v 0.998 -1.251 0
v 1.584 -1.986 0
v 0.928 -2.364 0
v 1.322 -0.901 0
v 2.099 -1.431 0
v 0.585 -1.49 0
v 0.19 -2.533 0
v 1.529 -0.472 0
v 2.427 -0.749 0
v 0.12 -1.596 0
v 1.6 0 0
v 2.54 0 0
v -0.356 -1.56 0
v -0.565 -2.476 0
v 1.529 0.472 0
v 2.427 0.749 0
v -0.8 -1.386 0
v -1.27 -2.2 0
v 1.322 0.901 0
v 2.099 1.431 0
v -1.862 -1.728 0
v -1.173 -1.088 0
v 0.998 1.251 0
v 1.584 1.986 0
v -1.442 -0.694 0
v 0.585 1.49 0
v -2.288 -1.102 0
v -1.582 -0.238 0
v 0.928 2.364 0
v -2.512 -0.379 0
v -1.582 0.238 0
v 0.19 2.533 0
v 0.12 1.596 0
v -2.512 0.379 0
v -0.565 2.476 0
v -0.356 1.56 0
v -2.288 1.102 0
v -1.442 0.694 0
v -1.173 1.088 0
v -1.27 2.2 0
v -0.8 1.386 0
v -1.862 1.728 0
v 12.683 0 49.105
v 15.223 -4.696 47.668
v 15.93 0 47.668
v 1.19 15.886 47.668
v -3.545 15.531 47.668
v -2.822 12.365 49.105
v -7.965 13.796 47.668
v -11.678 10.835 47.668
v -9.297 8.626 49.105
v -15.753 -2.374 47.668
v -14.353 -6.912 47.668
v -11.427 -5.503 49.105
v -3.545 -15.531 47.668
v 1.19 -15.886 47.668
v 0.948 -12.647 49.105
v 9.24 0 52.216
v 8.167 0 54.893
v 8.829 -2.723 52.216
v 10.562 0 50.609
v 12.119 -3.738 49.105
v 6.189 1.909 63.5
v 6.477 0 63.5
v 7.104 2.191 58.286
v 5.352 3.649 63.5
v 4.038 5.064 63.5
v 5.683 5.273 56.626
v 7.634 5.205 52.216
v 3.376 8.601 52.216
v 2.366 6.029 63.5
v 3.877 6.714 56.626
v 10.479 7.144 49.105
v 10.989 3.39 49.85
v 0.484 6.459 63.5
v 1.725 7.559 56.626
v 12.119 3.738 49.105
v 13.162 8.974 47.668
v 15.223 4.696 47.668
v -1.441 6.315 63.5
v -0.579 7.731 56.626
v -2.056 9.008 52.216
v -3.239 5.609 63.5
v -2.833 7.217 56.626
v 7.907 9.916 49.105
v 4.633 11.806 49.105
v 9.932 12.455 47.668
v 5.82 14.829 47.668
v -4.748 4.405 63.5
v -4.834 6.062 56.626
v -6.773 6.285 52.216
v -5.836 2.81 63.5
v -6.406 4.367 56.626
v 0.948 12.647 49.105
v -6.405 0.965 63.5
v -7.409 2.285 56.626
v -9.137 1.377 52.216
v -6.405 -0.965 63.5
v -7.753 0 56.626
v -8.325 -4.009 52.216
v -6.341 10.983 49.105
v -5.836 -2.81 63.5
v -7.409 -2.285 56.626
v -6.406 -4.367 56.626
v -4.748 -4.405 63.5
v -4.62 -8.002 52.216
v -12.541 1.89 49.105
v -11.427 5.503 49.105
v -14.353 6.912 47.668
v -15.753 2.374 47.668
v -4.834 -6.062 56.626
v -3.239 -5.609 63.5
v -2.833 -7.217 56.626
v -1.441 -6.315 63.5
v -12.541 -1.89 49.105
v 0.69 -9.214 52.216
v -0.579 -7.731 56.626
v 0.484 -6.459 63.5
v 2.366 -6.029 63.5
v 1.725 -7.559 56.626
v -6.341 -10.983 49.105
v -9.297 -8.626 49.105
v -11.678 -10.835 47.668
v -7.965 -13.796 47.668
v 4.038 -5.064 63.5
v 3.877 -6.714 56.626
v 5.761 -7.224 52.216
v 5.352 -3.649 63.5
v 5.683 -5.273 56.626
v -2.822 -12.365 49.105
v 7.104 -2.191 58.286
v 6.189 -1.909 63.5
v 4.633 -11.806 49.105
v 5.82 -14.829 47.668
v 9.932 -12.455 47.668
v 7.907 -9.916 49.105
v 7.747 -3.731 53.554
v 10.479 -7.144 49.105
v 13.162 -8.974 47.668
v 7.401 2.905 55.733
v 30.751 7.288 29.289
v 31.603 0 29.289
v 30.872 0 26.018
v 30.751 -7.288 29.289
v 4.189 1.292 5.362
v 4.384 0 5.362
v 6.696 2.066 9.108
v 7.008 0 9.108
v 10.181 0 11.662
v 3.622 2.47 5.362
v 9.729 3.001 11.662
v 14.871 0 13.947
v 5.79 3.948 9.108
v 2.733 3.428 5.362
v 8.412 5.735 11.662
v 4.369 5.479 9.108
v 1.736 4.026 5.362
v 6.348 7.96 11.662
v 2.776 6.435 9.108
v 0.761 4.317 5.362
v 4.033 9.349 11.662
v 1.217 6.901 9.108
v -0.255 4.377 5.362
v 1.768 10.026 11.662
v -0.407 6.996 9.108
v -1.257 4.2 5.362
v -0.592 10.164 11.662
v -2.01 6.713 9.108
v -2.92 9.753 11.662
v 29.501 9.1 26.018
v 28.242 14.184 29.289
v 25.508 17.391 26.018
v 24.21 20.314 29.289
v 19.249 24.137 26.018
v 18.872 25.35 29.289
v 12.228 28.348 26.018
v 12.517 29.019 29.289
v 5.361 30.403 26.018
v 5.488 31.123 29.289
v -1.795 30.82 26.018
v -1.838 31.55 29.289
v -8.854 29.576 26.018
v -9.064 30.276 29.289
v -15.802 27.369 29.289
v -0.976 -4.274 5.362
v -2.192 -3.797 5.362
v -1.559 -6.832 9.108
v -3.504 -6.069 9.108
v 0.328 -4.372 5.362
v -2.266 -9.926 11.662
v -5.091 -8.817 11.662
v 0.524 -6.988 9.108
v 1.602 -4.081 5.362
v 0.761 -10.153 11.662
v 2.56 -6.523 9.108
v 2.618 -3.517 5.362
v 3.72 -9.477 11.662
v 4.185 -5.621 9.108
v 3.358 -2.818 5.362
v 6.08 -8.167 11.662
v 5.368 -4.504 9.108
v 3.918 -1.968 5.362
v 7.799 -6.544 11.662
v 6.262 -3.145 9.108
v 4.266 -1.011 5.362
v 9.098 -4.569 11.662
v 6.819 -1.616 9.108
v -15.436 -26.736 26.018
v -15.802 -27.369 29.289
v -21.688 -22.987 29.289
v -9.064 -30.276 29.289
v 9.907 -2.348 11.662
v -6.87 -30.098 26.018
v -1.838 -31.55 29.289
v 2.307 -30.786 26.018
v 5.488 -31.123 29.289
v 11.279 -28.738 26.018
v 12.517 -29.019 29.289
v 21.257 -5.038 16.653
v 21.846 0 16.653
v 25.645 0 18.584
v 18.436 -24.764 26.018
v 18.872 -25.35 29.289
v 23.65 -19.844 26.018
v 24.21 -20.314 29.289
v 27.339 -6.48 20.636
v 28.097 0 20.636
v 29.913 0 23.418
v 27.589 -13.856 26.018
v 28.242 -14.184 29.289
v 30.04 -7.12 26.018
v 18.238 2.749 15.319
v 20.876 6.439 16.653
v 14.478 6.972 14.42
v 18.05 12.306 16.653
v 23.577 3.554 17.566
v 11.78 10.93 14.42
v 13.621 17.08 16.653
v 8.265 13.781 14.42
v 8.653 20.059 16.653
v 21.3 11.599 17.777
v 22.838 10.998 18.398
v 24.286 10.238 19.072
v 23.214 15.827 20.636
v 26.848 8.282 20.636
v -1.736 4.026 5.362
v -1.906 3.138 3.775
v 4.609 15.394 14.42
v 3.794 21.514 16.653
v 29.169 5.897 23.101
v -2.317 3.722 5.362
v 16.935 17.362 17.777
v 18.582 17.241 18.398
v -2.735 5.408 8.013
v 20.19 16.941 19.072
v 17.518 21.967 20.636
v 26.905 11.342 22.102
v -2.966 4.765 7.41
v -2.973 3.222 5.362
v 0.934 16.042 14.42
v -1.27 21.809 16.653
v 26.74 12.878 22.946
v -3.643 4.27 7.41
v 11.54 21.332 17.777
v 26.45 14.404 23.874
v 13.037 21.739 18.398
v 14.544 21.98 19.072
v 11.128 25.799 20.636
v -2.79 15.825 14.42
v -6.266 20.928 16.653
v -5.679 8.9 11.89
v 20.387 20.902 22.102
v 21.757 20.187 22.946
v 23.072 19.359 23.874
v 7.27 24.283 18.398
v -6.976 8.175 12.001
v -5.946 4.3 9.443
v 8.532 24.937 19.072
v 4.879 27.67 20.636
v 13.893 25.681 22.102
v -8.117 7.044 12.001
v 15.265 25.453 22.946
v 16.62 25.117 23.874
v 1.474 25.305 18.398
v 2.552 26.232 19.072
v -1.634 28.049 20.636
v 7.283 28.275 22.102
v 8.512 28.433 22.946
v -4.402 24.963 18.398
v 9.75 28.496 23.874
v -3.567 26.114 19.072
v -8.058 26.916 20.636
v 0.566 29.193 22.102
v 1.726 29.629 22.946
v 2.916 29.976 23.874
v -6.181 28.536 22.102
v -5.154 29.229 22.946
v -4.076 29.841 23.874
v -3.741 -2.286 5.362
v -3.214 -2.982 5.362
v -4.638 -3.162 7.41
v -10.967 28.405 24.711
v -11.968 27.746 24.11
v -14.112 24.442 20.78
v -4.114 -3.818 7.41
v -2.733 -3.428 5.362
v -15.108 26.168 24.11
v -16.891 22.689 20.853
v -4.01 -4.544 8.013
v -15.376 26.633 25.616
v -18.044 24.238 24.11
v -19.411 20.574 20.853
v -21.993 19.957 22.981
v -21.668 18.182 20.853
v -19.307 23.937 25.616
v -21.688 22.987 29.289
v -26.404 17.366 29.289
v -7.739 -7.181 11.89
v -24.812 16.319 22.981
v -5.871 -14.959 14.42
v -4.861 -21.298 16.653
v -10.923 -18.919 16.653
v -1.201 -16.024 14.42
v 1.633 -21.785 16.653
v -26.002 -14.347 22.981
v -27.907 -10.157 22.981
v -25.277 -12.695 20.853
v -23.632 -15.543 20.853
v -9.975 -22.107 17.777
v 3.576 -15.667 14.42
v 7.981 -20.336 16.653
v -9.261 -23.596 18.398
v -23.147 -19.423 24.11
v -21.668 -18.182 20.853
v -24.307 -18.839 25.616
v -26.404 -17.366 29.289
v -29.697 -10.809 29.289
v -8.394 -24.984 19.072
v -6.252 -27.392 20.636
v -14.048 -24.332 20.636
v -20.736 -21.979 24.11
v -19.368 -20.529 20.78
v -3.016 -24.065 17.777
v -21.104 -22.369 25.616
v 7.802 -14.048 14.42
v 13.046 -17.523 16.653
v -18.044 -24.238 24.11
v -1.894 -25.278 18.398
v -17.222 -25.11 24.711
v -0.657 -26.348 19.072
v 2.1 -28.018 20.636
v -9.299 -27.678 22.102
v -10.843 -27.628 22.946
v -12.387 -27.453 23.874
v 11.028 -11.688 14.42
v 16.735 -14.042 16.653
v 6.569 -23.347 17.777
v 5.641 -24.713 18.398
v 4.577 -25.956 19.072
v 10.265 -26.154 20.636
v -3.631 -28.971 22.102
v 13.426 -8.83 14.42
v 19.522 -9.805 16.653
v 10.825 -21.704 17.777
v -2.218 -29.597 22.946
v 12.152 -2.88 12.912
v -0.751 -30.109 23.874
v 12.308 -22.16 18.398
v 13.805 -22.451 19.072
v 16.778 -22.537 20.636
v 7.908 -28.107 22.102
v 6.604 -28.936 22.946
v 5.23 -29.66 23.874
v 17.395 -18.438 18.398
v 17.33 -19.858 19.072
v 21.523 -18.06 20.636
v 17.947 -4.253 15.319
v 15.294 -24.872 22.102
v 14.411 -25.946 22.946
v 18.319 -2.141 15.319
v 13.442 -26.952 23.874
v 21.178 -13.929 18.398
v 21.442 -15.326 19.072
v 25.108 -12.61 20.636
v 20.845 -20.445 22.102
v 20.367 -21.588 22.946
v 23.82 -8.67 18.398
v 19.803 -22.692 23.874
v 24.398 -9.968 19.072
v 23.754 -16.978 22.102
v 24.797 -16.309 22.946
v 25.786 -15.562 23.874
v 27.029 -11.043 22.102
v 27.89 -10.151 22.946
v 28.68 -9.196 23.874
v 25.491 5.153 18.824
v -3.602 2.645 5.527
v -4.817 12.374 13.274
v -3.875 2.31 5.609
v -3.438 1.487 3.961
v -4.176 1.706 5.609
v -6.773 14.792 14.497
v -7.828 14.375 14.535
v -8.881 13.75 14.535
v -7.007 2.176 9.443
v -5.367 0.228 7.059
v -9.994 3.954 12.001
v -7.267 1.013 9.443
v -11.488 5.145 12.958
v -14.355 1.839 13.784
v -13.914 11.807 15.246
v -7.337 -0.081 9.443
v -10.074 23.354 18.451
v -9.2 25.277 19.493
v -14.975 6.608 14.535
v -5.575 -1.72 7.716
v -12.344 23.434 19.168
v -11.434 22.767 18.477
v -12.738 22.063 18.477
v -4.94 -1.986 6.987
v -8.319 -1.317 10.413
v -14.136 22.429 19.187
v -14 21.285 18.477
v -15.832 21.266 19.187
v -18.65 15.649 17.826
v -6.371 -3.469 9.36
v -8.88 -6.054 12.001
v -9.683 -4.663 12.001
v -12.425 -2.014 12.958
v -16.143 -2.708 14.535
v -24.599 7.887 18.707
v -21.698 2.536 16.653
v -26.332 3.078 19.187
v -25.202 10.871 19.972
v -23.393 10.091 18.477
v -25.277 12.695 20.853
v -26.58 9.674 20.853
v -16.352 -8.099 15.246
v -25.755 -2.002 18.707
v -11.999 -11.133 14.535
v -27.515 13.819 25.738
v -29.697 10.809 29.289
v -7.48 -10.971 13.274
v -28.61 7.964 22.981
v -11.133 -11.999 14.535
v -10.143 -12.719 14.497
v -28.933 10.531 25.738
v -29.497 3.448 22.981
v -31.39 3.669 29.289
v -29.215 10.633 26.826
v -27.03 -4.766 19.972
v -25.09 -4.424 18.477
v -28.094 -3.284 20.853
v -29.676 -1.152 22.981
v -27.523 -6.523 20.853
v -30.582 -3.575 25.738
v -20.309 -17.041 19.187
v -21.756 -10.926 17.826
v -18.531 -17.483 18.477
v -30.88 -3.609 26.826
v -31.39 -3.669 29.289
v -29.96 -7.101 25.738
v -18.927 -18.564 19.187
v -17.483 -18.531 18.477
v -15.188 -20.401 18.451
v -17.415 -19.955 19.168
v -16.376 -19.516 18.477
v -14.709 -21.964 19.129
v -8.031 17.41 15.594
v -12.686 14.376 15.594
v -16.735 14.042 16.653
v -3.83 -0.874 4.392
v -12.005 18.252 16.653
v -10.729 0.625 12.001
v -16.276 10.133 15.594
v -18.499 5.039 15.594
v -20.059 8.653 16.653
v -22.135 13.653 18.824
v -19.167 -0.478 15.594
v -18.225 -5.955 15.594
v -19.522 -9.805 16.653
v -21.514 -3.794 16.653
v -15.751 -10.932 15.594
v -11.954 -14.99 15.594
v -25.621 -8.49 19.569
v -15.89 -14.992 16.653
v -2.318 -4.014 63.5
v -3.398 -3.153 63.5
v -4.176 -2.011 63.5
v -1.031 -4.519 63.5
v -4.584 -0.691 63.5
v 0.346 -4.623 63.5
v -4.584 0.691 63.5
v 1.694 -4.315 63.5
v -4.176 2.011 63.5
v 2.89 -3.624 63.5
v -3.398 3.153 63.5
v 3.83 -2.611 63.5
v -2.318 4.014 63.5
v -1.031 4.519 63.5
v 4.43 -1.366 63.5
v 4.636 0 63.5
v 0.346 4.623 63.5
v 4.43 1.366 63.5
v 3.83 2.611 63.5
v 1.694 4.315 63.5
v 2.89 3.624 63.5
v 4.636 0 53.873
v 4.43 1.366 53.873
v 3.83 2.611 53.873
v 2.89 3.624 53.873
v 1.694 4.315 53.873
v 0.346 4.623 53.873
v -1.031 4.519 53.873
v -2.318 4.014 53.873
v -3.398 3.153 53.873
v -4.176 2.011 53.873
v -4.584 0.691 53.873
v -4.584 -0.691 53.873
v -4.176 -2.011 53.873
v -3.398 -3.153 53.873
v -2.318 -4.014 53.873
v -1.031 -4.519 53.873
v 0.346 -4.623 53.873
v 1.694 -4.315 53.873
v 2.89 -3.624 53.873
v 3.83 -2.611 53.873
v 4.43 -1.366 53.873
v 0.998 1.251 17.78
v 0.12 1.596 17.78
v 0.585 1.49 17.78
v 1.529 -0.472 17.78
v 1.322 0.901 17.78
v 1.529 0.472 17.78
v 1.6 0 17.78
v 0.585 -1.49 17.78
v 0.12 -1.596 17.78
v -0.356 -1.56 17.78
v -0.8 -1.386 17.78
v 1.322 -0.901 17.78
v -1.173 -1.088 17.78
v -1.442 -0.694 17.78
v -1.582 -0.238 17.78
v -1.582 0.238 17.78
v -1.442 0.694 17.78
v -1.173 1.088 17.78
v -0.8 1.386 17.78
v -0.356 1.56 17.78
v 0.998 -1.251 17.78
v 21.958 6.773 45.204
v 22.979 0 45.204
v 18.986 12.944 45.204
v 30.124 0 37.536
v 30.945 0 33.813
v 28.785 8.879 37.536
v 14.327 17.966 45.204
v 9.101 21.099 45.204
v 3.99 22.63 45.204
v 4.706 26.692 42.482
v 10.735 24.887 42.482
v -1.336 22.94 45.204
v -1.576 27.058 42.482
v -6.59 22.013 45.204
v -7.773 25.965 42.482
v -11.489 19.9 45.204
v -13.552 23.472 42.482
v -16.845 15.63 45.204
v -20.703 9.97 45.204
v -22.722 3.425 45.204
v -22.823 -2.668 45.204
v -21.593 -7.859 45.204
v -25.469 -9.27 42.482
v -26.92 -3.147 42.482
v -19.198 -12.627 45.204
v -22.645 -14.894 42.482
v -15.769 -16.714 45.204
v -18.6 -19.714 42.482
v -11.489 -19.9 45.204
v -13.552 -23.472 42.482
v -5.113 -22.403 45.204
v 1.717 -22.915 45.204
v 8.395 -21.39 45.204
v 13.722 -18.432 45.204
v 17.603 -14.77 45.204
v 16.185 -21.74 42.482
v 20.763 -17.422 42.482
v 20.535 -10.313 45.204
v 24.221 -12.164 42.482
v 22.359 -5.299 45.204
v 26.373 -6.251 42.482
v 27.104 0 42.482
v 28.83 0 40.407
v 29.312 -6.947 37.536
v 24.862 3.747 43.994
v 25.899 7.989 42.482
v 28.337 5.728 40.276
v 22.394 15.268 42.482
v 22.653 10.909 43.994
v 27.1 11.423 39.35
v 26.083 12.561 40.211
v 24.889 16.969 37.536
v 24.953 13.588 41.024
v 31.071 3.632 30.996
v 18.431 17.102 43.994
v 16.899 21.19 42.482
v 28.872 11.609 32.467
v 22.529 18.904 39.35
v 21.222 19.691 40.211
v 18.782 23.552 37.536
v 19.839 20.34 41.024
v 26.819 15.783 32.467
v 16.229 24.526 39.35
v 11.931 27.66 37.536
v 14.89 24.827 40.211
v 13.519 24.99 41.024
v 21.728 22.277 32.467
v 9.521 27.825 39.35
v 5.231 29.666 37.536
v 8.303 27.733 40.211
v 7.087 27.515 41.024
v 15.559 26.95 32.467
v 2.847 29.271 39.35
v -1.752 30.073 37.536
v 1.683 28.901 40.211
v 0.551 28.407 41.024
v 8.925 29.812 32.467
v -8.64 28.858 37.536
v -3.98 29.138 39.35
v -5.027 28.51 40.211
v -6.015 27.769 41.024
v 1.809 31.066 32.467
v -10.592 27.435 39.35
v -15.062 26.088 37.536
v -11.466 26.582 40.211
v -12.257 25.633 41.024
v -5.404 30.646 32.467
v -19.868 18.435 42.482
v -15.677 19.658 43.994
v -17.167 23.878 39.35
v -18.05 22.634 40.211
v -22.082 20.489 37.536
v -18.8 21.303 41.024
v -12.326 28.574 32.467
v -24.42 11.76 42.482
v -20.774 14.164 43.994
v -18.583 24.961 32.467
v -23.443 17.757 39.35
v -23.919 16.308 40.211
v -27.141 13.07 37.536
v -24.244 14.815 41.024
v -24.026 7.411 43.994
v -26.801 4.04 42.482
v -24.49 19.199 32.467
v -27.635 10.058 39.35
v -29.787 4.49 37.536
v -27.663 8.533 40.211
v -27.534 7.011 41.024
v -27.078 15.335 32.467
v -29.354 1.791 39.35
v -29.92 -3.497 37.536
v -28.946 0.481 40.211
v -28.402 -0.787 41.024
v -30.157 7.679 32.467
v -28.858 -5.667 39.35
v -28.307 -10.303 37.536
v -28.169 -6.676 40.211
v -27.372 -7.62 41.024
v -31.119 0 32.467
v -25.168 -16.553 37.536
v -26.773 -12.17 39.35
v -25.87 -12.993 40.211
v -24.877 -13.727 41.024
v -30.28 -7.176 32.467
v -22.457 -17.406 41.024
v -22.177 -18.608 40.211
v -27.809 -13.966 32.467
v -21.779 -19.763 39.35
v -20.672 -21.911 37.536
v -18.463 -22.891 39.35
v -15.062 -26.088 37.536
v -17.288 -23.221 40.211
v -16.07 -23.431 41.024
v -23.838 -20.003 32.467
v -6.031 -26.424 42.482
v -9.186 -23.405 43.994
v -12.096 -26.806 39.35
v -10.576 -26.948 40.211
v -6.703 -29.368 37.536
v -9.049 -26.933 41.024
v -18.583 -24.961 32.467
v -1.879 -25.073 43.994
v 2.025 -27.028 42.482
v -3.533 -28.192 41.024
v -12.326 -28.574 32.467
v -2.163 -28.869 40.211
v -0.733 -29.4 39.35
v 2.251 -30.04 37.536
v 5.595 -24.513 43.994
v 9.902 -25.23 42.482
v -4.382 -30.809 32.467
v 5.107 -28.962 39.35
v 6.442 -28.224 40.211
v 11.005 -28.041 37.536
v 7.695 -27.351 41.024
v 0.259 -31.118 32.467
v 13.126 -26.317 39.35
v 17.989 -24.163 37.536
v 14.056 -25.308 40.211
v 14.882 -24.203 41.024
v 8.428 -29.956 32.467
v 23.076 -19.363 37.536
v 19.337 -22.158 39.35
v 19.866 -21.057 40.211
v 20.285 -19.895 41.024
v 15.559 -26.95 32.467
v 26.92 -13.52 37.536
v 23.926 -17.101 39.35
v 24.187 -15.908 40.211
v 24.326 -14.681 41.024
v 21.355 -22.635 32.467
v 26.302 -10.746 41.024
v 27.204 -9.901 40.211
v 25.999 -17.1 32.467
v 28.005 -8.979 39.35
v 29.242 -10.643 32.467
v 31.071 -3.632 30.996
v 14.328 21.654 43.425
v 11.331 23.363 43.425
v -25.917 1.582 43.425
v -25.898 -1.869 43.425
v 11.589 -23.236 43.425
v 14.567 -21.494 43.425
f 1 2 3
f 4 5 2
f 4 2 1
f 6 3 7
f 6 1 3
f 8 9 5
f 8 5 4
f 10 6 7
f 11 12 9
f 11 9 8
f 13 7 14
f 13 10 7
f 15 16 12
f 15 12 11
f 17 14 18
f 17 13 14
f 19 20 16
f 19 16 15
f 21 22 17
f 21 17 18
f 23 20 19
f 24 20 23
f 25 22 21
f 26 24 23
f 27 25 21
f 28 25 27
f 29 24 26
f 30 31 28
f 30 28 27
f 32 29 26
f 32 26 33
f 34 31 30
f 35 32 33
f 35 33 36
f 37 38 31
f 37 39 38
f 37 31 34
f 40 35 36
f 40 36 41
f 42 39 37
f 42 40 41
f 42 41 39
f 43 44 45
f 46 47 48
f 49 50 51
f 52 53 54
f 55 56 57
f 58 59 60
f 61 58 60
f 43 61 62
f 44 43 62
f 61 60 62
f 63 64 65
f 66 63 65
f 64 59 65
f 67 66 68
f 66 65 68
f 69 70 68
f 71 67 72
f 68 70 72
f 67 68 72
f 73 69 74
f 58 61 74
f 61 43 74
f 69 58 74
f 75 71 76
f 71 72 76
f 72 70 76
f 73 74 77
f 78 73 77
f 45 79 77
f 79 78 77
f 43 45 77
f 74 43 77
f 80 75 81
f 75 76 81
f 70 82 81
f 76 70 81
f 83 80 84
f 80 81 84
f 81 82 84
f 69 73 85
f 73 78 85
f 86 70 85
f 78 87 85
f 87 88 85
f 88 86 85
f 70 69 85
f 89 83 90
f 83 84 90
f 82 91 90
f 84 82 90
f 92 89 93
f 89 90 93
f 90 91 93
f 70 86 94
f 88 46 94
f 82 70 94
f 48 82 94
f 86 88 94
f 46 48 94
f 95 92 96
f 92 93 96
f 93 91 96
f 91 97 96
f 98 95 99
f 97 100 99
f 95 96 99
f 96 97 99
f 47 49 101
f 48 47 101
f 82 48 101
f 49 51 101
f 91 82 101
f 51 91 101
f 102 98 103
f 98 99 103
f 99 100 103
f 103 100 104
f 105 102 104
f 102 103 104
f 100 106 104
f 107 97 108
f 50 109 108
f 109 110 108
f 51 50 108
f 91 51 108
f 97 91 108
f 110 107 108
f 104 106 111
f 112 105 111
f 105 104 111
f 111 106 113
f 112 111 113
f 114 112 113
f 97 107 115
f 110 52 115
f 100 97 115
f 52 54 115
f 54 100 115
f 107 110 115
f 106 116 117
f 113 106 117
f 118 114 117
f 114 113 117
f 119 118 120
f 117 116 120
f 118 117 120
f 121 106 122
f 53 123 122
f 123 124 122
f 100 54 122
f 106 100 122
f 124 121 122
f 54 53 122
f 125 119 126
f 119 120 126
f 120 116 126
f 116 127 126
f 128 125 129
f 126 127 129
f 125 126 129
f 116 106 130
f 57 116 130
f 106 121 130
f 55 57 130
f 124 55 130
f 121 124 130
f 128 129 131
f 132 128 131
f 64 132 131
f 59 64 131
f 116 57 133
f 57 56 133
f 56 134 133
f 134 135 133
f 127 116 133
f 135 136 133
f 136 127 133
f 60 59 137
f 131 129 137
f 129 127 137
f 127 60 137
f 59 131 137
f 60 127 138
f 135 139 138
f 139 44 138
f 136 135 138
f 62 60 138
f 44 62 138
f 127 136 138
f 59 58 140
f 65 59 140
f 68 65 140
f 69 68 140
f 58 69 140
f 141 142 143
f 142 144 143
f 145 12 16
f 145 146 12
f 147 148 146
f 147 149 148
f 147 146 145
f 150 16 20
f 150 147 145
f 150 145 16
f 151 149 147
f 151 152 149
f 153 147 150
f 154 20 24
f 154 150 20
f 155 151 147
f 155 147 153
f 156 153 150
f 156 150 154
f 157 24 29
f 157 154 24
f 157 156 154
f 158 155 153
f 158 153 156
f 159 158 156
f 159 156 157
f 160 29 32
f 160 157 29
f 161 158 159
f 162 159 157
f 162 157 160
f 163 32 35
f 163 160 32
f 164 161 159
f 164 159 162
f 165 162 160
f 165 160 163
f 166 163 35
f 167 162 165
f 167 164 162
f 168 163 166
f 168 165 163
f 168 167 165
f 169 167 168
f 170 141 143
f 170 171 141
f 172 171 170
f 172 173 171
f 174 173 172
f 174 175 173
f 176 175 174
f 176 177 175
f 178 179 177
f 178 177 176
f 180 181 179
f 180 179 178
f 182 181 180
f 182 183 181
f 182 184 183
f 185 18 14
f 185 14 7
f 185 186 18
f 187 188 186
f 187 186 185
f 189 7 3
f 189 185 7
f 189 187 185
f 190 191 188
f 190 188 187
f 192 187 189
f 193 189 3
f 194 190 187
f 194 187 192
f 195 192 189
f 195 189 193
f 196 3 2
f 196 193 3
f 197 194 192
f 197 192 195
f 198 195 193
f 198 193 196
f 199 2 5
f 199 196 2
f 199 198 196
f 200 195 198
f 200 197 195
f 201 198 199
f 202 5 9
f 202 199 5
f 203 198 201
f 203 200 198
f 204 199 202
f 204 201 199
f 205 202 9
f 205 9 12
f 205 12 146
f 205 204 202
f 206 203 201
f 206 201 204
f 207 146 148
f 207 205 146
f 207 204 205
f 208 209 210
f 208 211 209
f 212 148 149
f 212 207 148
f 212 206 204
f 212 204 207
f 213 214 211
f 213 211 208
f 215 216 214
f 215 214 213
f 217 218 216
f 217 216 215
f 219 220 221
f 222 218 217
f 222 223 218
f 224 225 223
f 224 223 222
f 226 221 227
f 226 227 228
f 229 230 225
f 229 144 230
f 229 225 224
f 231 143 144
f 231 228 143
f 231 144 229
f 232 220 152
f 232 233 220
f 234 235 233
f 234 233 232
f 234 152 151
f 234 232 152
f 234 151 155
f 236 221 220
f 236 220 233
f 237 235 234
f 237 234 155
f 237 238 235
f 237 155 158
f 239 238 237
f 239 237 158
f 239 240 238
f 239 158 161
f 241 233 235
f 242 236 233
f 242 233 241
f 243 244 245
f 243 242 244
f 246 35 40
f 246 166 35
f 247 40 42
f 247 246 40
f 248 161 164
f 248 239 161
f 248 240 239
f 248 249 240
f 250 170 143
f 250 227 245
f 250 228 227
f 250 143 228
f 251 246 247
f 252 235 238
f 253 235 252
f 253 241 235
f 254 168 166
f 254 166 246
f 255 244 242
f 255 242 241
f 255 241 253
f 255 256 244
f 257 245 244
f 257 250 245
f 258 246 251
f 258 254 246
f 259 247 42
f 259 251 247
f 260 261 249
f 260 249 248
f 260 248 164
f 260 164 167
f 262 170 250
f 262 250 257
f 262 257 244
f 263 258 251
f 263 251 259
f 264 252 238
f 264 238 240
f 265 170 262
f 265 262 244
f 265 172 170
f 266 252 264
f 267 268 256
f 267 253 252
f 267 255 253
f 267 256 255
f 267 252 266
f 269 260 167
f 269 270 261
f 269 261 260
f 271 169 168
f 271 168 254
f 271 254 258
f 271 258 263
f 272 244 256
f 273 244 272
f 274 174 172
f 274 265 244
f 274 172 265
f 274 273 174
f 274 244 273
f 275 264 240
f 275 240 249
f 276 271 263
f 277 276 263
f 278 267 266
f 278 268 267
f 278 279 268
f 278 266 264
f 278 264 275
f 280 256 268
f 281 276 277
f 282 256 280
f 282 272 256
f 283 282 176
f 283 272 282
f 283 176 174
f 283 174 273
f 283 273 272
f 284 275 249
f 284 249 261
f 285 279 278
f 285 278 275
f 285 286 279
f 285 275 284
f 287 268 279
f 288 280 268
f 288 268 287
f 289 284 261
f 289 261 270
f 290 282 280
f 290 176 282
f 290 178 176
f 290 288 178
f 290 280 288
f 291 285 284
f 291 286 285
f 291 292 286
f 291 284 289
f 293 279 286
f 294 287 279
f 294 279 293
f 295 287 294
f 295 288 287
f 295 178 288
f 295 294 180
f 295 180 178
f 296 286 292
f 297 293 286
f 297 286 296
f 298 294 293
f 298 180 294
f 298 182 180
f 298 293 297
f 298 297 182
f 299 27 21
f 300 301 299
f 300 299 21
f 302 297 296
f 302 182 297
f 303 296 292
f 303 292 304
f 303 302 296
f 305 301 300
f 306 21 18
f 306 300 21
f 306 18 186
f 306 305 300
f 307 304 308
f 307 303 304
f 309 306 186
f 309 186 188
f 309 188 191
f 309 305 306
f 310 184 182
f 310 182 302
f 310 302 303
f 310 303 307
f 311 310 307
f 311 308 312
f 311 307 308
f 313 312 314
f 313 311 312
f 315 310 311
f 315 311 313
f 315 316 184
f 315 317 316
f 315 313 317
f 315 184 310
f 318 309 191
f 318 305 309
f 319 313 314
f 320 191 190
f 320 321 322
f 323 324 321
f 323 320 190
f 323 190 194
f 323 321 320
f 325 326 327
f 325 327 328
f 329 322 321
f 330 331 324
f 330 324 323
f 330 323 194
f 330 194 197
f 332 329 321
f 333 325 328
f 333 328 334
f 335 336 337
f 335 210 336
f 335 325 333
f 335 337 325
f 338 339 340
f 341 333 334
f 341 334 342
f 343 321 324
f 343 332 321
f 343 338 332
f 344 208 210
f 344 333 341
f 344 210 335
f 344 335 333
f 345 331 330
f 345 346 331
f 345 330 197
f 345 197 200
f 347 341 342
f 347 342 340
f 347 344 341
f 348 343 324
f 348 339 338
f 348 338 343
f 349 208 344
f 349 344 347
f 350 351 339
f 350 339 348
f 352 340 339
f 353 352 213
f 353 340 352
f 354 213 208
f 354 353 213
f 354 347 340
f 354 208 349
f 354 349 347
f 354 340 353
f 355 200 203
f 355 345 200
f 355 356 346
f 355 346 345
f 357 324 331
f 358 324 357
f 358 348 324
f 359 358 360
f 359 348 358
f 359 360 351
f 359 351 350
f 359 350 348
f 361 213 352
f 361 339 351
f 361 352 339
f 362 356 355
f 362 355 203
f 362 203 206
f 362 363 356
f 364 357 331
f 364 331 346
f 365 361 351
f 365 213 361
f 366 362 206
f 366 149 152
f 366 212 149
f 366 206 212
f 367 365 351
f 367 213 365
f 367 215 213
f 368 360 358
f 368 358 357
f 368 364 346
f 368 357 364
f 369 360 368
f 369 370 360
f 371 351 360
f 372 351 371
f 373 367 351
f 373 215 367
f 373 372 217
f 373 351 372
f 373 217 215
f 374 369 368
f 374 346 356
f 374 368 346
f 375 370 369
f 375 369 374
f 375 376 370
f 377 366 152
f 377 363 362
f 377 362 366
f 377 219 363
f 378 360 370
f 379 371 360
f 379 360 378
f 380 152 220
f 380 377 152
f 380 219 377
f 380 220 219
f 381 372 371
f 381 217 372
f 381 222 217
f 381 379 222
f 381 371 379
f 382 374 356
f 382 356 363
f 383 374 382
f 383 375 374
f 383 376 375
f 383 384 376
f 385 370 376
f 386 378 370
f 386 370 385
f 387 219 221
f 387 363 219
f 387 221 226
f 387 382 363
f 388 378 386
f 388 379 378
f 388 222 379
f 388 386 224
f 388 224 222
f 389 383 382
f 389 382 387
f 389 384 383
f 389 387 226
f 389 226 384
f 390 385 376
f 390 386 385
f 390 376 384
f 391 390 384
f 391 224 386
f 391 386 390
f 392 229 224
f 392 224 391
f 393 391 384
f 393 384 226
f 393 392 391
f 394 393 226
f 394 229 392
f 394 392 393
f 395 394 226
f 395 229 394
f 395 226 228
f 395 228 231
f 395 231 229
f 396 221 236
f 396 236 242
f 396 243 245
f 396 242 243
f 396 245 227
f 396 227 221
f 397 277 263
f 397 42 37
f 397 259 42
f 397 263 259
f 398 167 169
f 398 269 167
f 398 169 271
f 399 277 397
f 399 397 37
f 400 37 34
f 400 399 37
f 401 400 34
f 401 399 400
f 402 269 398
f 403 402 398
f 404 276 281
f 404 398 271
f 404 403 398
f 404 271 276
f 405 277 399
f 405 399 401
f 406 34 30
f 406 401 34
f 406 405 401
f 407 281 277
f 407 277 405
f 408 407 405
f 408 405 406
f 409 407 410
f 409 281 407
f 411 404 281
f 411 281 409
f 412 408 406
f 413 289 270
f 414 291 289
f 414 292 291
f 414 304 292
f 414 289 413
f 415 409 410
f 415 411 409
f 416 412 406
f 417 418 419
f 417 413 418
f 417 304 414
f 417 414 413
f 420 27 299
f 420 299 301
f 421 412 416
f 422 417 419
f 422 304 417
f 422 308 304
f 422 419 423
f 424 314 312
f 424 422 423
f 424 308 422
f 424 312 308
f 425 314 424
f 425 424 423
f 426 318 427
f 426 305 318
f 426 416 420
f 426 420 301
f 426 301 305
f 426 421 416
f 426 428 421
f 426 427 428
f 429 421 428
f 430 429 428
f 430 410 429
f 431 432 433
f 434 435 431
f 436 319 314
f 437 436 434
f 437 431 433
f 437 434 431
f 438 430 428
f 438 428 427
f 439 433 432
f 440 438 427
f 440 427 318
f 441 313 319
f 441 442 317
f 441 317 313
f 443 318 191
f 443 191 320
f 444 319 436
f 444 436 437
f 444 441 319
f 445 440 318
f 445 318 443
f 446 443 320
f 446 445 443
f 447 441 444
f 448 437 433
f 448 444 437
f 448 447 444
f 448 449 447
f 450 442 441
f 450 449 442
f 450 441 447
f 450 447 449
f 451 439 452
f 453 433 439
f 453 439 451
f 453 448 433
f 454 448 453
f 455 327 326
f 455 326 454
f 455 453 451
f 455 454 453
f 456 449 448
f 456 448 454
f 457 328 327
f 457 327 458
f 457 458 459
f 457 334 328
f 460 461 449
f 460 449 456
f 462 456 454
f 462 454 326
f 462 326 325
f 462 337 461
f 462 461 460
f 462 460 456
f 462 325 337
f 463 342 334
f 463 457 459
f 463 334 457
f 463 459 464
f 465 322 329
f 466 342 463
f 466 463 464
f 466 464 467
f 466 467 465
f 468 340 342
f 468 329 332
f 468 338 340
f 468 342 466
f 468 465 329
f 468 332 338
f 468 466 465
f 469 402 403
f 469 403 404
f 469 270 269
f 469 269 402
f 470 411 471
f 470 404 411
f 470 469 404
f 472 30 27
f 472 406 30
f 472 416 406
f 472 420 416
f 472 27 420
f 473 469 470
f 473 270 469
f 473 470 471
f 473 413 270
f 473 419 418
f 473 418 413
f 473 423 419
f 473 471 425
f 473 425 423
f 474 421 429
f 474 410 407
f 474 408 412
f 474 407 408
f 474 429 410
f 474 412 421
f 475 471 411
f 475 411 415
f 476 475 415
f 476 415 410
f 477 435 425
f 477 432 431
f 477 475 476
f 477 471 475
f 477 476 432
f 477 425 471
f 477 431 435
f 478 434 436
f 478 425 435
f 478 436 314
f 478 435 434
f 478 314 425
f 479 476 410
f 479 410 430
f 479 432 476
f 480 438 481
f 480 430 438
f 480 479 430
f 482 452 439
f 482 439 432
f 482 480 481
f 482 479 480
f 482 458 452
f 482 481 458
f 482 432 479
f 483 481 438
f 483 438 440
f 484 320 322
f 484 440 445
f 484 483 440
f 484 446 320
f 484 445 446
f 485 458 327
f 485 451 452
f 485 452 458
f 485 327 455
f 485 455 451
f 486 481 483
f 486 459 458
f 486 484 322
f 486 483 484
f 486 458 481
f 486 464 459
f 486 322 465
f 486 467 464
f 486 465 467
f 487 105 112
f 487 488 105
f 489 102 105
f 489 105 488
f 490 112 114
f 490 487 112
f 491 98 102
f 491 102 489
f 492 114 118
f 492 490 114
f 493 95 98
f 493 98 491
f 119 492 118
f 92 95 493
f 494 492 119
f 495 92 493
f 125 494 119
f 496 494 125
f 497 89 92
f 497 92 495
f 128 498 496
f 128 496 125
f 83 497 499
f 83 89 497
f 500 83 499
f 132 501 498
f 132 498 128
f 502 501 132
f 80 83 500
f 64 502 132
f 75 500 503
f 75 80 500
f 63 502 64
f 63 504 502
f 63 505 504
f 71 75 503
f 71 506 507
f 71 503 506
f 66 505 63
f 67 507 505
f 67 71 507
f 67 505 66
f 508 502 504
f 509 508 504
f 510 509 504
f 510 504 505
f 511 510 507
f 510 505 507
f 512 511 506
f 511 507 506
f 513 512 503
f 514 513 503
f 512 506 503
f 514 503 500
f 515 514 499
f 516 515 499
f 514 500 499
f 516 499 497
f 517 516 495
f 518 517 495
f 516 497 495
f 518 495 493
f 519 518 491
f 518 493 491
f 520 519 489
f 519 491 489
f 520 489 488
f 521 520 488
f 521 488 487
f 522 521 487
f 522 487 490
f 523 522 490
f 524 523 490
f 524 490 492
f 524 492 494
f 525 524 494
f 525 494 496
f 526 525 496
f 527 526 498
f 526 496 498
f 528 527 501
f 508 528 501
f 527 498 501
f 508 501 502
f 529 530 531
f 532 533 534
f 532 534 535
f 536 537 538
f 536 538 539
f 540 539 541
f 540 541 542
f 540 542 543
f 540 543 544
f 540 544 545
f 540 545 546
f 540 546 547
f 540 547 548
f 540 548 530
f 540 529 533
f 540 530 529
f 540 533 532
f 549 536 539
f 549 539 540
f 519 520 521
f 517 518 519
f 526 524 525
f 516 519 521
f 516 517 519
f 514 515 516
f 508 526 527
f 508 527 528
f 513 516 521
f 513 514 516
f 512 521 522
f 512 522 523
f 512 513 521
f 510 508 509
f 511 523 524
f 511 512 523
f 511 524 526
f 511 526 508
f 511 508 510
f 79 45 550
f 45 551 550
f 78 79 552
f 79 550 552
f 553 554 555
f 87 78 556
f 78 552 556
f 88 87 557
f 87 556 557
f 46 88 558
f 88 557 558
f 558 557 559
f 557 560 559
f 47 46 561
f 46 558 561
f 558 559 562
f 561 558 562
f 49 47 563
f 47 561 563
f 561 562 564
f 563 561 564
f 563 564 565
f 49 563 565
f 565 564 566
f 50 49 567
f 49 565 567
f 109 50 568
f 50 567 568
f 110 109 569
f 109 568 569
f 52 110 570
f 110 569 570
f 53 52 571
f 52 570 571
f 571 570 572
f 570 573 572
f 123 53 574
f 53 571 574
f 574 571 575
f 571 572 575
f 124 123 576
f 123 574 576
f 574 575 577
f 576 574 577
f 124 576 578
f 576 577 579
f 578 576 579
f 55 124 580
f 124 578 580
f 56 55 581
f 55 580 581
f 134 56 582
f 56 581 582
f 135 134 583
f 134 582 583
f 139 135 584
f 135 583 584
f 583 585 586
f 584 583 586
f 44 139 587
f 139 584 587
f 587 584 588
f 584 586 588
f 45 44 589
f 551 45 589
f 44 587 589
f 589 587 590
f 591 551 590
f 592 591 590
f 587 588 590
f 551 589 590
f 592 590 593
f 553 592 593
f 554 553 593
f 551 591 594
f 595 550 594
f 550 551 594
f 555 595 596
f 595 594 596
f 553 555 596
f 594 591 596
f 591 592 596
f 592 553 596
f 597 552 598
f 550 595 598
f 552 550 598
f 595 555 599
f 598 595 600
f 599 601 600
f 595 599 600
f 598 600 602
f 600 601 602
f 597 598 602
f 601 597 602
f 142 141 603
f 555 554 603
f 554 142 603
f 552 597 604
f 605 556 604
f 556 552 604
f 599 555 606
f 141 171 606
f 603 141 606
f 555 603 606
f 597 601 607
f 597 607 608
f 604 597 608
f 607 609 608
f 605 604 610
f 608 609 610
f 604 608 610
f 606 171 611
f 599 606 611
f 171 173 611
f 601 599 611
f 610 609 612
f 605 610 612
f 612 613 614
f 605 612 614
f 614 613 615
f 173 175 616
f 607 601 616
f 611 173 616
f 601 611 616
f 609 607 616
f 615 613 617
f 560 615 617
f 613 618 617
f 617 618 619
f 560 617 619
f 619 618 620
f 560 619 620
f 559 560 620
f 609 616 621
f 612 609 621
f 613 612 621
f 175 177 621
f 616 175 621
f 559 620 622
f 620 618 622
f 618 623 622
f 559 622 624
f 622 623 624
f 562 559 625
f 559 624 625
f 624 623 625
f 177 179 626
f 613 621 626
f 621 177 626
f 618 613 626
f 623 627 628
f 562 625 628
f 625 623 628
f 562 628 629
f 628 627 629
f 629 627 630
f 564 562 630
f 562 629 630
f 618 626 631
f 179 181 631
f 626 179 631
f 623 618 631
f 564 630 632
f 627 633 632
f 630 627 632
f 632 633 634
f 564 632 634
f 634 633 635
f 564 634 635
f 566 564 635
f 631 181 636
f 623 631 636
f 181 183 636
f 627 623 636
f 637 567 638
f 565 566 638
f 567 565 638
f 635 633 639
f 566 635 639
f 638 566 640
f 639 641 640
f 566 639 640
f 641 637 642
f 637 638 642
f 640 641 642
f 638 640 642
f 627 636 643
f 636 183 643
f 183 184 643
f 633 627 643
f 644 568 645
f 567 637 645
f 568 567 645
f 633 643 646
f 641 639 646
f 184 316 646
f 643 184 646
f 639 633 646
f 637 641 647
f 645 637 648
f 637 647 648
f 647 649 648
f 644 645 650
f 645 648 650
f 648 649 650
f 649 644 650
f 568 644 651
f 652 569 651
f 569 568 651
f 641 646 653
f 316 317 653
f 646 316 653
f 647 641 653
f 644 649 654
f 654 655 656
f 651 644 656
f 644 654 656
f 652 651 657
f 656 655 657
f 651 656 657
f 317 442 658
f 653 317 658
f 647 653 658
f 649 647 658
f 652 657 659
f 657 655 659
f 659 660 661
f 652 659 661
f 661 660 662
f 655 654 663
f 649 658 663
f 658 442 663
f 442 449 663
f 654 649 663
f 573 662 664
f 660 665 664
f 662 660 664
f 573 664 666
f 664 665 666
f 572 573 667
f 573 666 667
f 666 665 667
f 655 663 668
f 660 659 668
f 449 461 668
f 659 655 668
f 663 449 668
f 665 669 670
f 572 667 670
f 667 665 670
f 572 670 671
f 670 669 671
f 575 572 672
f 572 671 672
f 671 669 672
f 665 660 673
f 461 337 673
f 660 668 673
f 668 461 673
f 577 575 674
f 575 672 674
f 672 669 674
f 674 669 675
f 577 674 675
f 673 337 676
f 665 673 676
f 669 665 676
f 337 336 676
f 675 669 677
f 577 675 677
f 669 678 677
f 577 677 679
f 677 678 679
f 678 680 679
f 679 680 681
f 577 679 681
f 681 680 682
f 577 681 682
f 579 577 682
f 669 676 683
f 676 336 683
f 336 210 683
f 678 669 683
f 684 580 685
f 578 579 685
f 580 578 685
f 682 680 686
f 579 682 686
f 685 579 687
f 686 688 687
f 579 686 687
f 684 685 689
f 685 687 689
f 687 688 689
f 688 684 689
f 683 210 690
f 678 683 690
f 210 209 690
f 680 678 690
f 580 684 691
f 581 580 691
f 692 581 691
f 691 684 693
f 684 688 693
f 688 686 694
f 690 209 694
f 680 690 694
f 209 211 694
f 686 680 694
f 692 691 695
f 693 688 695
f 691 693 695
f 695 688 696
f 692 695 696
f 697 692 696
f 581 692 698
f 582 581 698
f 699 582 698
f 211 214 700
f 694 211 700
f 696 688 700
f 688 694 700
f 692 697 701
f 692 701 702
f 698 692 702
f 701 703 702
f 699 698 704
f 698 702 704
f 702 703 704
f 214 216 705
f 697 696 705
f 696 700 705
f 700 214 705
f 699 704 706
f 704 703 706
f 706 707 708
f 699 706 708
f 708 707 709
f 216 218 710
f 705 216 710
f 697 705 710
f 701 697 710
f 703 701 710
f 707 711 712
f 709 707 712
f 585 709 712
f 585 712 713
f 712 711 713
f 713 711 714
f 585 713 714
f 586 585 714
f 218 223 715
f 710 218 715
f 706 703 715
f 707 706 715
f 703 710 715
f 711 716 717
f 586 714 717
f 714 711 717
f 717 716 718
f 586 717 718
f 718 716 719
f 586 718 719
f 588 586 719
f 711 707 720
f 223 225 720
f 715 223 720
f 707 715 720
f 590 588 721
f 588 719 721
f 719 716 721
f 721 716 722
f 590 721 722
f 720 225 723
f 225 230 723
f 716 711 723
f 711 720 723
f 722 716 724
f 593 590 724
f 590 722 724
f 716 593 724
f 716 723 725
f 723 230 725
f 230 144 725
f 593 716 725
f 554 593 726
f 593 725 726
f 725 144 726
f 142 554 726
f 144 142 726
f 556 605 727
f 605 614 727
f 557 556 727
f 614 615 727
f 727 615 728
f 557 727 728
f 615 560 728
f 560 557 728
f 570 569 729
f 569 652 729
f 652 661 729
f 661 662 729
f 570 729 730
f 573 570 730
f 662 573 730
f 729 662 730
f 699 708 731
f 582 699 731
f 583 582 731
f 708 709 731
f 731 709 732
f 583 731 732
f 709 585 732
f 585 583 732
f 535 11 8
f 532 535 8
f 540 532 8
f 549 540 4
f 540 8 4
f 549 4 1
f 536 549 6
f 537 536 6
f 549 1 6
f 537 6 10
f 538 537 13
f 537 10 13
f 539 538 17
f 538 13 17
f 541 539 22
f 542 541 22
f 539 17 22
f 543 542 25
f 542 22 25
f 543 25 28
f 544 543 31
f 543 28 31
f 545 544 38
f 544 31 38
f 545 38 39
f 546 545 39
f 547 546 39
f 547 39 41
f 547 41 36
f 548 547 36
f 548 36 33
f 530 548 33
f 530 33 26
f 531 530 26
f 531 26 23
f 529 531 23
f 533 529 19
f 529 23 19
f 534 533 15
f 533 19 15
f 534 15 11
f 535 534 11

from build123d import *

# Parameters (mm, degrees)
F2_R     = 4.6355
F3_DEPTH = 9.6266
F4_R     = 1.6002
F5_DEPTH = 17.78


with BuildPart() as f1:
    # F0 (on Front) → F1 (revolve)
    with BuildSketch(Plane.XZ):
        with BuildLine():
            Line((0, 63.5), (0, 0))
            Line((0, 0), (2.54, 0))
            add(Edge.make_bspline(
                [(2.54, 0), (4.4955178308, 8.9577542199), (13.6341014895, 14.0566703587), (27.2440773123, 18.006695005), (30.6364371254, 23.6615275733), (31.6033065319, 29.2893778533)],
                knots=[0, 0, 0, 0, 0.3805291705, 0.6949358612, 1, 1, 1, 1], degree=3))
            add(Edge.make_bspline(
                [(15.9304495901, 47.6675145328), (18.1947364367, 47.0149396925), (31.7745328674, 43.8231587691), (31.0048823649, 30.6266996795), (31.6033065319, 29.2893778533)],
                knots=[0, 0, 0, 0, 0.5193371743, 1, 1, 1, 1], degree=3))
            add(Edge.make_bspline(
                [(6.477, 63.5), (7.4262102711, 58.5987261493), (7.9060794268, 54.2243340147), (10.2791442096, 49.685836314), (15.9304495901, 47.6675145328)],
                knots=[0, 0, 0, 0, 0.4923300194, 1, 1, 1, 1], degree=3))
            Line((6.477, 63.5), (0, 63.5))
        make_face()
    revolve(axis=Axis((0, 0, 31.75), (0, 0, 1)))

    # F2 (on face) → F3 (cut)
    with BuildSketch(Plane.XY.offset(63.5)):
        Circle(F2_R)
    extrude(amount=-F3_DEPTH, mode=Mode.SUBTRACT)

    # F4 (on face) → F5 (cut)
    with BuildSketch(Plane(origin=(0, 0, 0), x_dir=(1, 0, 0), z_dir=(0, 0, -1))):
        Circle(F4_R)
    extrude(amount=-F5_DEPTH, mode=Mode.SUBTRACT)


solid = f1.part
